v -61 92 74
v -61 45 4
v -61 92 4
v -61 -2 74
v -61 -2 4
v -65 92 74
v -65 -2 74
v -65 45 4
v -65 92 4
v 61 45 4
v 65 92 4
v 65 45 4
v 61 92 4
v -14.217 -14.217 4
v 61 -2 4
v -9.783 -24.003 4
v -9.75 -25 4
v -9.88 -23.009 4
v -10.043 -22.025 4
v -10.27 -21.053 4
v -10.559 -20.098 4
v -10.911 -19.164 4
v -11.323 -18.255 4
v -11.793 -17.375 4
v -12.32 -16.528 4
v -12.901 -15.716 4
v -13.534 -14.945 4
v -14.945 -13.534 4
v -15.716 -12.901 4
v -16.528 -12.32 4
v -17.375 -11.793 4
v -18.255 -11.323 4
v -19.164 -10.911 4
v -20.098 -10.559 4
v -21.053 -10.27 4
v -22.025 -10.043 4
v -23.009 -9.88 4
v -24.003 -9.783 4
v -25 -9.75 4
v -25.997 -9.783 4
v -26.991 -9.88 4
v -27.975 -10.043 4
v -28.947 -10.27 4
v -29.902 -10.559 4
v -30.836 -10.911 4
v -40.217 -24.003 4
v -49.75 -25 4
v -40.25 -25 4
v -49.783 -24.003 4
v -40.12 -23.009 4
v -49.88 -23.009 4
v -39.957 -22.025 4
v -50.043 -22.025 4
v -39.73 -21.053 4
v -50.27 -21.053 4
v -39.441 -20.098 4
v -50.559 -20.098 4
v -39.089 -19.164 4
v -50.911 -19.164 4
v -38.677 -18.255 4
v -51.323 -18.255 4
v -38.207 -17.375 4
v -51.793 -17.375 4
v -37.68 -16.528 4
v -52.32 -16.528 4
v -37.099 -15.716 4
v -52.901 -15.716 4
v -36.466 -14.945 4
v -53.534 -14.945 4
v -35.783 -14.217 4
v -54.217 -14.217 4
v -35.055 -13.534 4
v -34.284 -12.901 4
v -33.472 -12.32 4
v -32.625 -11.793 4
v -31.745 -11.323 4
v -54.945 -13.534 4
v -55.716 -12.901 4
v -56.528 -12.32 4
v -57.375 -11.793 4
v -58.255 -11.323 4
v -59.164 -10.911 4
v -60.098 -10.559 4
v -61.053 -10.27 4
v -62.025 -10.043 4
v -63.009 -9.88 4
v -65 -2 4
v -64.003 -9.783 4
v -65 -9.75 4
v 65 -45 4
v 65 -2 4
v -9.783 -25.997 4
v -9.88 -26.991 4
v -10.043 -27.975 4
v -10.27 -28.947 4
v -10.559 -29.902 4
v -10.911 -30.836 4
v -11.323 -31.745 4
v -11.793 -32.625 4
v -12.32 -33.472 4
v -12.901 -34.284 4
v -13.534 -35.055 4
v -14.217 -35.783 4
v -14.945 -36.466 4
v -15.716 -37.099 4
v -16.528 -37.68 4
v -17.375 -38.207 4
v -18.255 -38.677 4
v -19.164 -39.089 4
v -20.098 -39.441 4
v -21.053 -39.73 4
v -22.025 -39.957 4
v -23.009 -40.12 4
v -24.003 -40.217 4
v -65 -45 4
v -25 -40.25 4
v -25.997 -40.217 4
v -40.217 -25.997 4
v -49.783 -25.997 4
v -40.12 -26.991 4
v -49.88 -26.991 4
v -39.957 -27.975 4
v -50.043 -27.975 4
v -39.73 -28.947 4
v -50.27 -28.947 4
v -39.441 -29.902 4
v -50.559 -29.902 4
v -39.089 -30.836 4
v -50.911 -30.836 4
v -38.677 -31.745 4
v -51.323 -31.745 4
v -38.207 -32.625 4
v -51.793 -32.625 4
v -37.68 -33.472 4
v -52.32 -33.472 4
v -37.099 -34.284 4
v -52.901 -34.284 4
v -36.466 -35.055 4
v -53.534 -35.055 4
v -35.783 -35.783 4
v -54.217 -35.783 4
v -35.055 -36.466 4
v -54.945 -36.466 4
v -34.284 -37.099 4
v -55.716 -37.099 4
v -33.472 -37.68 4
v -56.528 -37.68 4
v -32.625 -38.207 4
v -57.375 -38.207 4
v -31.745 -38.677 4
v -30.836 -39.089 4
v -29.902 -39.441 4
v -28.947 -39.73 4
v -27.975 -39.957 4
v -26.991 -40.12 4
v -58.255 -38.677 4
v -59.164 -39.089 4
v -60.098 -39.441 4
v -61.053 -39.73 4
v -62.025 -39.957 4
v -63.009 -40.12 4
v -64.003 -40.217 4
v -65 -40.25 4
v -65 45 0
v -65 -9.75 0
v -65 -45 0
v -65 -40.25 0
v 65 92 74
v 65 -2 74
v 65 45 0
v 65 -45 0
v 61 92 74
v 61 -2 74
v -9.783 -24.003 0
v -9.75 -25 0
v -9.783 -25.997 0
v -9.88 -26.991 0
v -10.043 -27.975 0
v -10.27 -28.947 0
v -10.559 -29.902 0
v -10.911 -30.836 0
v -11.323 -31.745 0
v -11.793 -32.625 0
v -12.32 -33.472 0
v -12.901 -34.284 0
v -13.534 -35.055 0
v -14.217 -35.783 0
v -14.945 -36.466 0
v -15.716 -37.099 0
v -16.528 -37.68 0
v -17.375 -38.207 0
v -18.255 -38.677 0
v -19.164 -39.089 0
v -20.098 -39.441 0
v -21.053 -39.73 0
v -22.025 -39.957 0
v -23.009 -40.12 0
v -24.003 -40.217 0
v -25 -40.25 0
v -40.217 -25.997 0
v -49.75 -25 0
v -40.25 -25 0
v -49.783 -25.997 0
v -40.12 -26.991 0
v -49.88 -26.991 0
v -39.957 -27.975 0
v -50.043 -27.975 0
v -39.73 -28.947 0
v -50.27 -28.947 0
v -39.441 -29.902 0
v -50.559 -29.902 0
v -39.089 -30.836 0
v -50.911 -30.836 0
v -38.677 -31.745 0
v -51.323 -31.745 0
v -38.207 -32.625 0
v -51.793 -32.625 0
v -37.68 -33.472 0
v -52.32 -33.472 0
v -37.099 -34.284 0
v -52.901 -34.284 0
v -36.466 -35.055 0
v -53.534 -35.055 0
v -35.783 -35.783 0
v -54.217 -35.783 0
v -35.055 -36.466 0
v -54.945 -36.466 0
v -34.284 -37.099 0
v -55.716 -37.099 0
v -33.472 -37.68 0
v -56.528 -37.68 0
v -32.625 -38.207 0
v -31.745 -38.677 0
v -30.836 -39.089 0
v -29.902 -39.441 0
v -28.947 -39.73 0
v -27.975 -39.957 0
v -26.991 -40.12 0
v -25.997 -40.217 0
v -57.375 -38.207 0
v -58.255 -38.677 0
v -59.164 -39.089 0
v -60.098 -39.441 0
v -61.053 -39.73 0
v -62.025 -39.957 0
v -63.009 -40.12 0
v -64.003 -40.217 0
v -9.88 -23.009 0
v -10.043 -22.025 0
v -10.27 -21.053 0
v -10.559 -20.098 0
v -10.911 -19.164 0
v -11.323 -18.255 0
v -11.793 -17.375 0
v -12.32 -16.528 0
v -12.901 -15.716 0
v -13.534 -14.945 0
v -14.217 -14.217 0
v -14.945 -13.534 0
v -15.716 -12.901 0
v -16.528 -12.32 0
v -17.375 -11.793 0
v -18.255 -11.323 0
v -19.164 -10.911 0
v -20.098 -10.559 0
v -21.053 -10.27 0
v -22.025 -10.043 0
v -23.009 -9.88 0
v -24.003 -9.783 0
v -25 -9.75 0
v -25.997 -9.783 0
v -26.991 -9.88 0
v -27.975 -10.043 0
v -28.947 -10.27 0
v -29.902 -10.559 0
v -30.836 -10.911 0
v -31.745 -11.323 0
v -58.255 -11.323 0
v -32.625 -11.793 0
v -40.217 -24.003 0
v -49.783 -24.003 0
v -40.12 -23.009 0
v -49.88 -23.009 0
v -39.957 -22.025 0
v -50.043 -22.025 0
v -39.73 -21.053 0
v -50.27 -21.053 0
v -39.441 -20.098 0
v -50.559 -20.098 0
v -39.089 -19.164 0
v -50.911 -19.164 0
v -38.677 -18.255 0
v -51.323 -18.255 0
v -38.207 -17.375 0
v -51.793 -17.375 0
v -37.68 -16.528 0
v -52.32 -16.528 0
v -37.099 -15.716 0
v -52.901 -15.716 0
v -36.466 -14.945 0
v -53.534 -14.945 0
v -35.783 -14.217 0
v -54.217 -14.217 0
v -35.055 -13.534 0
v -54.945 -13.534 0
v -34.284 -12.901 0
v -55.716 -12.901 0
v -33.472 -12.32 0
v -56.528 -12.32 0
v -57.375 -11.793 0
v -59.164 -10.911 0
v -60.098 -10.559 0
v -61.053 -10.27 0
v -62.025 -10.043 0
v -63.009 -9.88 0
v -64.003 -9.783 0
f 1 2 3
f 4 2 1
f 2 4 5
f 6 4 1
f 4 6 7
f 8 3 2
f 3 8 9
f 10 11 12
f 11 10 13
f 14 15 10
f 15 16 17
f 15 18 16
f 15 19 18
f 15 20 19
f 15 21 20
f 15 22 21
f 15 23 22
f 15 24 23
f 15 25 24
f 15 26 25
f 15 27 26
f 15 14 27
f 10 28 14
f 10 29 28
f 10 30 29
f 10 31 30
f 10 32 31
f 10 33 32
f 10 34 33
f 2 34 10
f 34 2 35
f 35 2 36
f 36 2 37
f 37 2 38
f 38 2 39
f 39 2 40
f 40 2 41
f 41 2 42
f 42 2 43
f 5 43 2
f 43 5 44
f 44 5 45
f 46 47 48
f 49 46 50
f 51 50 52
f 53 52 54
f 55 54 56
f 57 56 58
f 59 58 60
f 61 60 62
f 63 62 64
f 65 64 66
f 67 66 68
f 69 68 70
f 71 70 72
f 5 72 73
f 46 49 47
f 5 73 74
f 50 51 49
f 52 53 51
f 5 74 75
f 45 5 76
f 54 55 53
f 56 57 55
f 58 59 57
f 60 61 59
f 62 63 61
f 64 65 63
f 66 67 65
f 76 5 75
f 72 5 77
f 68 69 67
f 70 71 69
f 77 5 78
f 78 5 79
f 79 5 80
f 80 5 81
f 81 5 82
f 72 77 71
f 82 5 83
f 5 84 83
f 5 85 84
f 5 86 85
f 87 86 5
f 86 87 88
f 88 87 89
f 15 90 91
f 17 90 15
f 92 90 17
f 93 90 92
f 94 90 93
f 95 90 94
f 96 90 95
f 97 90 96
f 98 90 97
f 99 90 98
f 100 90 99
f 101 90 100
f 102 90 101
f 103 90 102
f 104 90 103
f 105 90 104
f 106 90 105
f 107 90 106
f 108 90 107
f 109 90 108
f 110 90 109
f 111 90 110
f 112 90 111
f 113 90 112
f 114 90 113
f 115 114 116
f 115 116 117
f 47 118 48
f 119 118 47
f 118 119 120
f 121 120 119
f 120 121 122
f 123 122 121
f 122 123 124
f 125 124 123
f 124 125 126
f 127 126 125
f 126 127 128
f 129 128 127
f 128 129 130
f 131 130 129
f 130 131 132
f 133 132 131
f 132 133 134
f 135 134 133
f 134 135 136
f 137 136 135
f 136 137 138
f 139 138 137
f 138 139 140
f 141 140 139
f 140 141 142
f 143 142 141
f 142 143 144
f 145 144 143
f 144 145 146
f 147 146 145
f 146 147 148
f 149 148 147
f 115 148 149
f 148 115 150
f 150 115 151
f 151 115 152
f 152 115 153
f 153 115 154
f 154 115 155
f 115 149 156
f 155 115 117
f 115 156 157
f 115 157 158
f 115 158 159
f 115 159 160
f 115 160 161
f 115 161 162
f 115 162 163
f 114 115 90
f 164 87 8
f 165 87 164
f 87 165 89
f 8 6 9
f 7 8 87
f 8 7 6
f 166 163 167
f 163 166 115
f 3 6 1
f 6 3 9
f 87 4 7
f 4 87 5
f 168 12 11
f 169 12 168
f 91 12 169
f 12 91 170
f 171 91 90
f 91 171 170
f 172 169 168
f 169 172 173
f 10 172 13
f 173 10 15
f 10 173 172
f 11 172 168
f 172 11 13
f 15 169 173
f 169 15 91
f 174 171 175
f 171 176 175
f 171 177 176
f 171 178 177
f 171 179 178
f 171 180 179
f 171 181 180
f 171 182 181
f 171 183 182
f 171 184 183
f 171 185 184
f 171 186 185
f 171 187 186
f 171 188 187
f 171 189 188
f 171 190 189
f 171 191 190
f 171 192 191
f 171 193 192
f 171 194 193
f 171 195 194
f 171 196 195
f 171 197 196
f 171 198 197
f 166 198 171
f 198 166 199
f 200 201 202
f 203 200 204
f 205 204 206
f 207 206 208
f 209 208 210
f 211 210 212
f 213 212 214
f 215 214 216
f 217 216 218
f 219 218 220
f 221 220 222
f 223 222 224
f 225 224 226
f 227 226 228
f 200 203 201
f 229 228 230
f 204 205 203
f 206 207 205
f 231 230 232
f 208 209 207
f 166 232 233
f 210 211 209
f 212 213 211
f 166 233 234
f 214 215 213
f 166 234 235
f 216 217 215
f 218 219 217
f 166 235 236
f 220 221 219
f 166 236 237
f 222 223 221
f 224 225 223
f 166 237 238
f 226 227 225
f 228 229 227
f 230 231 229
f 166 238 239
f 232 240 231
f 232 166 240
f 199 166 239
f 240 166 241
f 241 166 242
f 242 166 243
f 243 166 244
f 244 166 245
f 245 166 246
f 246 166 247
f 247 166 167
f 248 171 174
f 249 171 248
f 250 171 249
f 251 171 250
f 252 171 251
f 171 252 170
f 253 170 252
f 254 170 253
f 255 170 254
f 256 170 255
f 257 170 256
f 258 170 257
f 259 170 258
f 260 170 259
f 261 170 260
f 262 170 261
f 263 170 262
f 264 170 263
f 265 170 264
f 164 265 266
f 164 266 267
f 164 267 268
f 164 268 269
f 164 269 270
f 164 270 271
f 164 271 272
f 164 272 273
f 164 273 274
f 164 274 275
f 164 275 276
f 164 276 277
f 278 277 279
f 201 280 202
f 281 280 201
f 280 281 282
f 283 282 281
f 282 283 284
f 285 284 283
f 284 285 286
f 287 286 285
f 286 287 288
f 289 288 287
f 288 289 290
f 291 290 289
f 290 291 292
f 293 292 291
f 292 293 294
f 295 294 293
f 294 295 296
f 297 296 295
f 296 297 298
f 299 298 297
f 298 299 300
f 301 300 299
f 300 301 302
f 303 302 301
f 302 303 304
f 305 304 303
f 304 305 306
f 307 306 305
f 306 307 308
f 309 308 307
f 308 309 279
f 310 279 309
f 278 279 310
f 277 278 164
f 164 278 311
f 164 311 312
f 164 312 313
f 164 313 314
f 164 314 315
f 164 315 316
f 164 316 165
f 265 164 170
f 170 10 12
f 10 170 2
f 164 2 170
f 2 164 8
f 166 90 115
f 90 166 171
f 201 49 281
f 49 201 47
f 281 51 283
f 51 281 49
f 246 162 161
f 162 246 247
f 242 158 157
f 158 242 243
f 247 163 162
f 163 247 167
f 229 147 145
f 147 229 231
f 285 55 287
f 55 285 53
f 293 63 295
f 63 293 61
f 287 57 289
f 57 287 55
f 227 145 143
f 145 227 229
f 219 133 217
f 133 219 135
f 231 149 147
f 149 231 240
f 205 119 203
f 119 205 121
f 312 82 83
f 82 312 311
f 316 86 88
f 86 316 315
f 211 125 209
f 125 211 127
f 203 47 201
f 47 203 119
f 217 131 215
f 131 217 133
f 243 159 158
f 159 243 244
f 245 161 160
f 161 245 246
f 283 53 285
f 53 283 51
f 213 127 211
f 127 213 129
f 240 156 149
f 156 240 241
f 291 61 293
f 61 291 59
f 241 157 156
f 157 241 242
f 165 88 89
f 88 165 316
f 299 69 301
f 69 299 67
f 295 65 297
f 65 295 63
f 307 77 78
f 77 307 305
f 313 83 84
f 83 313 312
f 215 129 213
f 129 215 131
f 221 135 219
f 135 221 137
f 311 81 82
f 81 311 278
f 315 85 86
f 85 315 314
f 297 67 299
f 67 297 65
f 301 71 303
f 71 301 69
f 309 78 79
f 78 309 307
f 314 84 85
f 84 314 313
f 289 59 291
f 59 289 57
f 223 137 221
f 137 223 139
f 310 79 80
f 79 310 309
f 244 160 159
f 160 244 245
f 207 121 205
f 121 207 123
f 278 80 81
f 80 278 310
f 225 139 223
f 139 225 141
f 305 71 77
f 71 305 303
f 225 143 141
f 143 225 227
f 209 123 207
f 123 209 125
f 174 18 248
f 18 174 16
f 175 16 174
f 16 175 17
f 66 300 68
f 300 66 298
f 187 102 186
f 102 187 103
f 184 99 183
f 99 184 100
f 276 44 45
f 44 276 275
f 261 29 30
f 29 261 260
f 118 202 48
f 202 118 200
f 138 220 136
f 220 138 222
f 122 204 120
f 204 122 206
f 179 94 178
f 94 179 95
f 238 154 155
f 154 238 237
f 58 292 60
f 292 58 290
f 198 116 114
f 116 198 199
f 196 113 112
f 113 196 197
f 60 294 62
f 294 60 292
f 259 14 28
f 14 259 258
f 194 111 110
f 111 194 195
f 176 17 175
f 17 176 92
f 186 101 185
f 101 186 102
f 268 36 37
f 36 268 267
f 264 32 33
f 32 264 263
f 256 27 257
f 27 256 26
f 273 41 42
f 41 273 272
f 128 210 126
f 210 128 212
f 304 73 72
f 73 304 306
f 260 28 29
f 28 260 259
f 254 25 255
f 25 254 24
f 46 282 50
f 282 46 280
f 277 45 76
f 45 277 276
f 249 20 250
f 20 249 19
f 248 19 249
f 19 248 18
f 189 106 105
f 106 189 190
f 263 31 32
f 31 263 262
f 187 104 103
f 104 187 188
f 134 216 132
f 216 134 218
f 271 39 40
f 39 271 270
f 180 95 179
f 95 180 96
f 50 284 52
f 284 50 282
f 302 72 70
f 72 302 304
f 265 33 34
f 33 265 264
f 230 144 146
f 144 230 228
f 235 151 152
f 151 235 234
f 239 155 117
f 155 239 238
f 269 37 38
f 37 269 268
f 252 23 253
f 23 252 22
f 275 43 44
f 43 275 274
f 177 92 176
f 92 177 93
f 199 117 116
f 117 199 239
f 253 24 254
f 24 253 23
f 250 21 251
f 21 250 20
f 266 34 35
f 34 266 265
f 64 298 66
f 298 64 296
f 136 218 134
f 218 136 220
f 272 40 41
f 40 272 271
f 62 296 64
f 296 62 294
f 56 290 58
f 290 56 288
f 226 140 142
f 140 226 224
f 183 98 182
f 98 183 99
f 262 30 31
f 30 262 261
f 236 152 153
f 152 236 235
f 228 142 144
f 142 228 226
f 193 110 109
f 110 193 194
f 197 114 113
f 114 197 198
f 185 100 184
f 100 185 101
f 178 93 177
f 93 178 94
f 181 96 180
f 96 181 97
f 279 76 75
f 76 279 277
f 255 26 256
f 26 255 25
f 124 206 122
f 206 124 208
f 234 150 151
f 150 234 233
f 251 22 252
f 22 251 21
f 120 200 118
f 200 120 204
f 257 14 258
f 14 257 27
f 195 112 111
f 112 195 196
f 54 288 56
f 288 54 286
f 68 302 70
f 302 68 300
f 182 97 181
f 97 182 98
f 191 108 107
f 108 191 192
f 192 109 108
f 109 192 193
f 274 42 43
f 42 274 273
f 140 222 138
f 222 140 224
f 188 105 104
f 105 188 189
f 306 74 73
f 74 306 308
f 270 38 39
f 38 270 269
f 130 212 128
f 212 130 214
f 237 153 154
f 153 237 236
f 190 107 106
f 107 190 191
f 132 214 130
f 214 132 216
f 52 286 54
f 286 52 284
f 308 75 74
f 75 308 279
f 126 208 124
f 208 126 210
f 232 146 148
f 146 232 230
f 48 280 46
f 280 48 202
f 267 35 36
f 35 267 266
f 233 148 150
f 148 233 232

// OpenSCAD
// Rack for six 50 mL conical (Falcon-type) tubes
// Print orientation: flat plate on bed, walls rising to z = 70
// After printing, flip over so the rack stands on the walls

// ---------- Parameters ----------
plate_x      = 130;   // plate length along X (mm)
plate_y      = 90;    // plate width along Y (mm)
plate_t      = 4;     // plate thickness (mm), z = 0 to 4

hole_d       = 30.5;  // through-hole diameter (mm)
hole_nx      = 3;     // holes along X (2 rows)
hole_ny      = 2;     // holes along Y (3 columns)
hole_pitch   = 40;    // centre-to-centre spacing, both directions (mm)

wall_h       = 70;    // wall height from plate top (mm), z = 4 to 74
wall_t       = 4;     // wall thickness along Y (mm)

eps          = 0.5;   // cutter overshoot past faces (mm)
$fn          = 96;    // circle resolution

// ---------- Derived ----------
wall_top_z = plate_t + wall_h;   // top of walls (z = 74)

// ---------- Model ----------
difference() {
    union() {
        // Flat plate
        translate([-plate_x/2, -plate_y/2, 0])
            cube([plate_x, plate_y, plate_t]);

        // Two solid walls along the long edges
        for (sx = [-1, 1])
            translate([sx > 0 ? plate_x/2 - wall_t : -plate_x/2,
                       -wall_t/2, plate_t])
                cube([wall_t, plate_y + wall_t, wall_h]);
    }

    // Through-holes, centred on the plate
    for (i = [0 : hole_nx - 1])
        for (j = [0 : hole_ny - 1])
            translate([(i - (hole_nx - 1)/2) * hole_pitch - plate_x/2,
                       (j - (hole_ny - 1)/2) * hole_pitch - plate_y/2,
                       -eps])
                cylinder(d = hole_d, h = plate_t + 2*eps);
}
